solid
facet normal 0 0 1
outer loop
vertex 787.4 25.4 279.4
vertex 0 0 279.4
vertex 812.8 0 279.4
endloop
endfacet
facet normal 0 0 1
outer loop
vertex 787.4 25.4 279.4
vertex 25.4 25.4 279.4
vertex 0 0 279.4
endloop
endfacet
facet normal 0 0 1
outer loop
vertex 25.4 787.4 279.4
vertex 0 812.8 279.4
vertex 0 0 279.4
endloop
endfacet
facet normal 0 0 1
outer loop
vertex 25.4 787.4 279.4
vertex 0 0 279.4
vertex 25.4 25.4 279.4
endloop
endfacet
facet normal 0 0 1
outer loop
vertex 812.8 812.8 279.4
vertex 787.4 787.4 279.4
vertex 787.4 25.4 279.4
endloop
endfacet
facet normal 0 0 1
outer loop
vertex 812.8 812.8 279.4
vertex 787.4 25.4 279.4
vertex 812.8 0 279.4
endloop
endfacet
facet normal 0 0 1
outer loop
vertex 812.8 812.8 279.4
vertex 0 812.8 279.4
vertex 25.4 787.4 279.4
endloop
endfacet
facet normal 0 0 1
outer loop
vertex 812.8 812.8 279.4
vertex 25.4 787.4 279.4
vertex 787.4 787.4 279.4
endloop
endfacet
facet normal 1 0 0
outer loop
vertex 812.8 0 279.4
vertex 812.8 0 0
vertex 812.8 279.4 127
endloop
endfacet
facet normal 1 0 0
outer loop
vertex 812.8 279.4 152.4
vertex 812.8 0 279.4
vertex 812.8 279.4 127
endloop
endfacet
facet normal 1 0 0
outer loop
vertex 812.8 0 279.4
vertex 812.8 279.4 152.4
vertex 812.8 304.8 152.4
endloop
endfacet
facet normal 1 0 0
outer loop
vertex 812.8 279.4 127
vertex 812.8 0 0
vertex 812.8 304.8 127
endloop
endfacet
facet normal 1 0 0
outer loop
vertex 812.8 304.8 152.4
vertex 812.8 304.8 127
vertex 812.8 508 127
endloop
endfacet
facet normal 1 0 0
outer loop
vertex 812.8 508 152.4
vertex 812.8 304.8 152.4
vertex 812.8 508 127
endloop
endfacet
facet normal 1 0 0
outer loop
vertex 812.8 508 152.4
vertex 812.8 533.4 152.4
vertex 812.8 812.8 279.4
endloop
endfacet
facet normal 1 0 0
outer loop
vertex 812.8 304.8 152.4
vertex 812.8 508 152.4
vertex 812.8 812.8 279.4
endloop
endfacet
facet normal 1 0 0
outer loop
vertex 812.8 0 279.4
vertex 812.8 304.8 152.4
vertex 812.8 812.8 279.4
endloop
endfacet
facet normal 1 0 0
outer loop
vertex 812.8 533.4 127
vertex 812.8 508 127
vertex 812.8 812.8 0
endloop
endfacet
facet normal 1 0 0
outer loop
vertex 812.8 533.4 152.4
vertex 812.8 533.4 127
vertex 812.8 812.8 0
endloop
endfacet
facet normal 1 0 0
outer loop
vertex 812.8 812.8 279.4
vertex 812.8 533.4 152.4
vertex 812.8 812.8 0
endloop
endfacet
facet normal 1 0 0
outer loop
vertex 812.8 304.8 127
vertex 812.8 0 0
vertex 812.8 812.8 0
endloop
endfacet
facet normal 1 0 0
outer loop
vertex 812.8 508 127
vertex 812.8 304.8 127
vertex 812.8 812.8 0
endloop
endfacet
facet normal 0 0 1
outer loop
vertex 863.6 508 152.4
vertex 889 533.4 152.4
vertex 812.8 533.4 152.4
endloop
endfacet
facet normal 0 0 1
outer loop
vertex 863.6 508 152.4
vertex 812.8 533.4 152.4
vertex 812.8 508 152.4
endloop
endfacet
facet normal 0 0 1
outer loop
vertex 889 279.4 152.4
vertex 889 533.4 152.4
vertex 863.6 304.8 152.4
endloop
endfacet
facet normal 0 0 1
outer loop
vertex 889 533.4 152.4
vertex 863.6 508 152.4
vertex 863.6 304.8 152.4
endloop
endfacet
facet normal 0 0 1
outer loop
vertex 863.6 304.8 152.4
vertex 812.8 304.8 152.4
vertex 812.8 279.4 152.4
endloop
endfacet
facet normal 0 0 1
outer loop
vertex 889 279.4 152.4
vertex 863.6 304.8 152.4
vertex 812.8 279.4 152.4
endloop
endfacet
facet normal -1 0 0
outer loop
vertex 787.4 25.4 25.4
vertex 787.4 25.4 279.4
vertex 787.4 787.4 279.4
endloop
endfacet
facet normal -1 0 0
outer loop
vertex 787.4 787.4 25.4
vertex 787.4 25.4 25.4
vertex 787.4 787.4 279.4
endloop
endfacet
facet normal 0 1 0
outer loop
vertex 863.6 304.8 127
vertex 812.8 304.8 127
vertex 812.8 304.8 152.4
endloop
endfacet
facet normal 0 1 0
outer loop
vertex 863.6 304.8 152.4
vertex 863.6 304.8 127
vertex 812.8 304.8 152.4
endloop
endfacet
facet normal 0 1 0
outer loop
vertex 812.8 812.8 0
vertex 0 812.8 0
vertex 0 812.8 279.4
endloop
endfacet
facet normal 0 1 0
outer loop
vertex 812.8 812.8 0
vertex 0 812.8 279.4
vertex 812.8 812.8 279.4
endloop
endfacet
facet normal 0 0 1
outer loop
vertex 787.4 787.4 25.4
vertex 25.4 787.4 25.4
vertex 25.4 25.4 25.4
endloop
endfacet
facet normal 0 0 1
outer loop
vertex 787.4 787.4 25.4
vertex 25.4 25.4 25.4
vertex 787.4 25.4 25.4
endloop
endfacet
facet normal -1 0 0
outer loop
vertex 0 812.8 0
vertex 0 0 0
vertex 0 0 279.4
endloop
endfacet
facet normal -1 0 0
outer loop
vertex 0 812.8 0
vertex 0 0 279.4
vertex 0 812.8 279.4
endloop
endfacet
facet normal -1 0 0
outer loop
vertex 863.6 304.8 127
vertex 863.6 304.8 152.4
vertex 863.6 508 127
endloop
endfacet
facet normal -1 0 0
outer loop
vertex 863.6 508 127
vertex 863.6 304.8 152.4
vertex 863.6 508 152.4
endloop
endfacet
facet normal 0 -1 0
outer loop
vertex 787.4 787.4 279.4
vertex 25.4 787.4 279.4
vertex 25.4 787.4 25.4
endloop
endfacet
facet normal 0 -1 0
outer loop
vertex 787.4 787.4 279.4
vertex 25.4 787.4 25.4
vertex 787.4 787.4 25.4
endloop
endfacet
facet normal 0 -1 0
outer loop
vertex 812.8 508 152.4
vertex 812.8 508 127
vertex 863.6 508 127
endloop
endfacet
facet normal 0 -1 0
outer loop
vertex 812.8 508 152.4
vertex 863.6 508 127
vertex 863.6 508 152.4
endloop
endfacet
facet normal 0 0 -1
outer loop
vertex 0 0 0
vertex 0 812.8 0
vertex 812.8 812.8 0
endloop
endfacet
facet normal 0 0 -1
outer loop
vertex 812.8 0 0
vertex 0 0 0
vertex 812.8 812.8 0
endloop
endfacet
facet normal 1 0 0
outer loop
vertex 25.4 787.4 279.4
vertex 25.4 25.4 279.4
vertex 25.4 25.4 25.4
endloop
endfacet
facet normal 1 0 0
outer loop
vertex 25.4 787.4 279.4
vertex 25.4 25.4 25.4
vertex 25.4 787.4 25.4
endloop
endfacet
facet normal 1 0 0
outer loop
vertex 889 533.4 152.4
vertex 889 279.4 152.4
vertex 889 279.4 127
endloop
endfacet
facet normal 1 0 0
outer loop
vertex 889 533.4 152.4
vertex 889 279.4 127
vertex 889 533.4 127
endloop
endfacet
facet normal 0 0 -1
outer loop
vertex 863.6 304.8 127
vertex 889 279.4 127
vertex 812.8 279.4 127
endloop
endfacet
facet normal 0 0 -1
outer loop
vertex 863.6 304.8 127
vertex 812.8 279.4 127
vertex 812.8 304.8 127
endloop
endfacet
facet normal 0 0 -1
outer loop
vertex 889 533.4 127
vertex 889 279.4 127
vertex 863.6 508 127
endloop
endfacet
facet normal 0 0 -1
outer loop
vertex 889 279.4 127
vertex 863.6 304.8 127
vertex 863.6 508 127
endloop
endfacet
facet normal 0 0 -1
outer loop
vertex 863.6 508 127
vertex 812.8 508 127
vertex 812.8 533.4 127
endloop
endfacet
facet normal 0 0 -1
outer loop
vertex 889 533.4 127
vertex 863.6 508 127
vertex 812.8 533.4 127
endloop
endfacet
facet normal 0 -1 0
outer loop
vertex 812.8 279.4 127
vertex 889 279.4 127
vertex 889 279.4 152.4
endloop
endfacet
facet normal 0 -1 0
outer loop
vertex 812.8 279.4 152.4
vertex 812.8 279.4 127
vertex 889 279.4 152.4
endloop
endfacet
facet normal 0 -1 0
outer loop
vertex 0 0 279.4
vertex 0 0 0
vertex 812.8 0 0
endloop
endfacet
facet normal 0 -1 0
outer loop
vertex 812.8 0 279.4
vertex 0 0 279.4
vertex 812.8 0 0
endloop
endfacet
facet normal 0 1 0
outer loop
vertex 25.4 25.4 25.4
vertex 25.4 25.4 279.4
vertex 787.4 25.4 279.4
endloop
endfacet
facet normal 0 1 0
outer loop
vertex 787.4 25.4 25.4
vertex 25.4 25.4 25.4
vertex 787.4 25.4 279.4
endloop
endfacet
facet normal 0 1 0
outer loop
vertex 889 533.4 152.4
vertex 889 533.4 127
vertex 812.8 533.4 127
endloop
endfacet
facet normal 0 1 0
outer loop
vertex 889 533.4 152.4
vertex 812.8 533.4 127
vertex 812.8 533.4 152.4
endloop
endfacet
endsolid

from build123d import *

# Parameters (mm, degrees)
F0_W     = 812.8
F0_H     = 812.8
F1_DEPTH = 279.4
F2_W     = 762
F2_H     = 711.2
F3_DEPTH = 254
F4_W     = 25.4
F4_H     = 25.4
F5_DEPTH = 50.8
F6_W     = 228.6
F6_H     = 25.4
F6_W_2   = 25.4
F7_DEPTH = 25.4
F8_W     = 762
F8_H     = 50.8
F9_DEPTH = 254


with BuildPart() as f1:
    # F0 (on Top) → F1 (new body)
    with BuildSketch(Plane.XY):
        with Locations((406.4, 406.4)):
            Rectangle(F0_W, F0_H)
    extrude(amount=F1_DEPTH)

    # F2 (on face) → F3 (cut)
    with BuildSketch(Plane.XY.offset(279.4)):
        with Locations((406.4, 381)):
            Rectangle(F2_W, F2_H)
    extrude(amount=-F3_DEPTH, mode=Mode.SUBTRACT)

    # F4 (on face) → F5 (join)
    with BuildSketch(Plane.YZ.offset(812.8)):
        with Locations((292.1, 139.7)):
            Rectangle(F4_W, F4_H)
        with Locations((520.7, 139.7)):
            Rectangle(F4_W, F4_H)
    extrude(amount=F5_DEPTH)

    # F6 (on face) → F7 (join)
    with BuildSketch(Plane.YZ.offset(863.6)):
        with Locations((419.1, 139.7)):
            Rectangle(F6_W, F6_H)
        with Locations((292.1, 139.7)):
            Rectangle(F6_W_2, F6_H)
    extrude(amount=F7_DEPTH)

    # F8 (on face) → F9 (cut)
    with BuildSketch(Plane.XY.offset(279.4)):
        with Locations((406.4, 762)):
            Rectangle(F8_W, F8_H)
    extrude(amount=-F9_DEPTH, mode=Mode.SUBTRACT)


solid = f1.part
